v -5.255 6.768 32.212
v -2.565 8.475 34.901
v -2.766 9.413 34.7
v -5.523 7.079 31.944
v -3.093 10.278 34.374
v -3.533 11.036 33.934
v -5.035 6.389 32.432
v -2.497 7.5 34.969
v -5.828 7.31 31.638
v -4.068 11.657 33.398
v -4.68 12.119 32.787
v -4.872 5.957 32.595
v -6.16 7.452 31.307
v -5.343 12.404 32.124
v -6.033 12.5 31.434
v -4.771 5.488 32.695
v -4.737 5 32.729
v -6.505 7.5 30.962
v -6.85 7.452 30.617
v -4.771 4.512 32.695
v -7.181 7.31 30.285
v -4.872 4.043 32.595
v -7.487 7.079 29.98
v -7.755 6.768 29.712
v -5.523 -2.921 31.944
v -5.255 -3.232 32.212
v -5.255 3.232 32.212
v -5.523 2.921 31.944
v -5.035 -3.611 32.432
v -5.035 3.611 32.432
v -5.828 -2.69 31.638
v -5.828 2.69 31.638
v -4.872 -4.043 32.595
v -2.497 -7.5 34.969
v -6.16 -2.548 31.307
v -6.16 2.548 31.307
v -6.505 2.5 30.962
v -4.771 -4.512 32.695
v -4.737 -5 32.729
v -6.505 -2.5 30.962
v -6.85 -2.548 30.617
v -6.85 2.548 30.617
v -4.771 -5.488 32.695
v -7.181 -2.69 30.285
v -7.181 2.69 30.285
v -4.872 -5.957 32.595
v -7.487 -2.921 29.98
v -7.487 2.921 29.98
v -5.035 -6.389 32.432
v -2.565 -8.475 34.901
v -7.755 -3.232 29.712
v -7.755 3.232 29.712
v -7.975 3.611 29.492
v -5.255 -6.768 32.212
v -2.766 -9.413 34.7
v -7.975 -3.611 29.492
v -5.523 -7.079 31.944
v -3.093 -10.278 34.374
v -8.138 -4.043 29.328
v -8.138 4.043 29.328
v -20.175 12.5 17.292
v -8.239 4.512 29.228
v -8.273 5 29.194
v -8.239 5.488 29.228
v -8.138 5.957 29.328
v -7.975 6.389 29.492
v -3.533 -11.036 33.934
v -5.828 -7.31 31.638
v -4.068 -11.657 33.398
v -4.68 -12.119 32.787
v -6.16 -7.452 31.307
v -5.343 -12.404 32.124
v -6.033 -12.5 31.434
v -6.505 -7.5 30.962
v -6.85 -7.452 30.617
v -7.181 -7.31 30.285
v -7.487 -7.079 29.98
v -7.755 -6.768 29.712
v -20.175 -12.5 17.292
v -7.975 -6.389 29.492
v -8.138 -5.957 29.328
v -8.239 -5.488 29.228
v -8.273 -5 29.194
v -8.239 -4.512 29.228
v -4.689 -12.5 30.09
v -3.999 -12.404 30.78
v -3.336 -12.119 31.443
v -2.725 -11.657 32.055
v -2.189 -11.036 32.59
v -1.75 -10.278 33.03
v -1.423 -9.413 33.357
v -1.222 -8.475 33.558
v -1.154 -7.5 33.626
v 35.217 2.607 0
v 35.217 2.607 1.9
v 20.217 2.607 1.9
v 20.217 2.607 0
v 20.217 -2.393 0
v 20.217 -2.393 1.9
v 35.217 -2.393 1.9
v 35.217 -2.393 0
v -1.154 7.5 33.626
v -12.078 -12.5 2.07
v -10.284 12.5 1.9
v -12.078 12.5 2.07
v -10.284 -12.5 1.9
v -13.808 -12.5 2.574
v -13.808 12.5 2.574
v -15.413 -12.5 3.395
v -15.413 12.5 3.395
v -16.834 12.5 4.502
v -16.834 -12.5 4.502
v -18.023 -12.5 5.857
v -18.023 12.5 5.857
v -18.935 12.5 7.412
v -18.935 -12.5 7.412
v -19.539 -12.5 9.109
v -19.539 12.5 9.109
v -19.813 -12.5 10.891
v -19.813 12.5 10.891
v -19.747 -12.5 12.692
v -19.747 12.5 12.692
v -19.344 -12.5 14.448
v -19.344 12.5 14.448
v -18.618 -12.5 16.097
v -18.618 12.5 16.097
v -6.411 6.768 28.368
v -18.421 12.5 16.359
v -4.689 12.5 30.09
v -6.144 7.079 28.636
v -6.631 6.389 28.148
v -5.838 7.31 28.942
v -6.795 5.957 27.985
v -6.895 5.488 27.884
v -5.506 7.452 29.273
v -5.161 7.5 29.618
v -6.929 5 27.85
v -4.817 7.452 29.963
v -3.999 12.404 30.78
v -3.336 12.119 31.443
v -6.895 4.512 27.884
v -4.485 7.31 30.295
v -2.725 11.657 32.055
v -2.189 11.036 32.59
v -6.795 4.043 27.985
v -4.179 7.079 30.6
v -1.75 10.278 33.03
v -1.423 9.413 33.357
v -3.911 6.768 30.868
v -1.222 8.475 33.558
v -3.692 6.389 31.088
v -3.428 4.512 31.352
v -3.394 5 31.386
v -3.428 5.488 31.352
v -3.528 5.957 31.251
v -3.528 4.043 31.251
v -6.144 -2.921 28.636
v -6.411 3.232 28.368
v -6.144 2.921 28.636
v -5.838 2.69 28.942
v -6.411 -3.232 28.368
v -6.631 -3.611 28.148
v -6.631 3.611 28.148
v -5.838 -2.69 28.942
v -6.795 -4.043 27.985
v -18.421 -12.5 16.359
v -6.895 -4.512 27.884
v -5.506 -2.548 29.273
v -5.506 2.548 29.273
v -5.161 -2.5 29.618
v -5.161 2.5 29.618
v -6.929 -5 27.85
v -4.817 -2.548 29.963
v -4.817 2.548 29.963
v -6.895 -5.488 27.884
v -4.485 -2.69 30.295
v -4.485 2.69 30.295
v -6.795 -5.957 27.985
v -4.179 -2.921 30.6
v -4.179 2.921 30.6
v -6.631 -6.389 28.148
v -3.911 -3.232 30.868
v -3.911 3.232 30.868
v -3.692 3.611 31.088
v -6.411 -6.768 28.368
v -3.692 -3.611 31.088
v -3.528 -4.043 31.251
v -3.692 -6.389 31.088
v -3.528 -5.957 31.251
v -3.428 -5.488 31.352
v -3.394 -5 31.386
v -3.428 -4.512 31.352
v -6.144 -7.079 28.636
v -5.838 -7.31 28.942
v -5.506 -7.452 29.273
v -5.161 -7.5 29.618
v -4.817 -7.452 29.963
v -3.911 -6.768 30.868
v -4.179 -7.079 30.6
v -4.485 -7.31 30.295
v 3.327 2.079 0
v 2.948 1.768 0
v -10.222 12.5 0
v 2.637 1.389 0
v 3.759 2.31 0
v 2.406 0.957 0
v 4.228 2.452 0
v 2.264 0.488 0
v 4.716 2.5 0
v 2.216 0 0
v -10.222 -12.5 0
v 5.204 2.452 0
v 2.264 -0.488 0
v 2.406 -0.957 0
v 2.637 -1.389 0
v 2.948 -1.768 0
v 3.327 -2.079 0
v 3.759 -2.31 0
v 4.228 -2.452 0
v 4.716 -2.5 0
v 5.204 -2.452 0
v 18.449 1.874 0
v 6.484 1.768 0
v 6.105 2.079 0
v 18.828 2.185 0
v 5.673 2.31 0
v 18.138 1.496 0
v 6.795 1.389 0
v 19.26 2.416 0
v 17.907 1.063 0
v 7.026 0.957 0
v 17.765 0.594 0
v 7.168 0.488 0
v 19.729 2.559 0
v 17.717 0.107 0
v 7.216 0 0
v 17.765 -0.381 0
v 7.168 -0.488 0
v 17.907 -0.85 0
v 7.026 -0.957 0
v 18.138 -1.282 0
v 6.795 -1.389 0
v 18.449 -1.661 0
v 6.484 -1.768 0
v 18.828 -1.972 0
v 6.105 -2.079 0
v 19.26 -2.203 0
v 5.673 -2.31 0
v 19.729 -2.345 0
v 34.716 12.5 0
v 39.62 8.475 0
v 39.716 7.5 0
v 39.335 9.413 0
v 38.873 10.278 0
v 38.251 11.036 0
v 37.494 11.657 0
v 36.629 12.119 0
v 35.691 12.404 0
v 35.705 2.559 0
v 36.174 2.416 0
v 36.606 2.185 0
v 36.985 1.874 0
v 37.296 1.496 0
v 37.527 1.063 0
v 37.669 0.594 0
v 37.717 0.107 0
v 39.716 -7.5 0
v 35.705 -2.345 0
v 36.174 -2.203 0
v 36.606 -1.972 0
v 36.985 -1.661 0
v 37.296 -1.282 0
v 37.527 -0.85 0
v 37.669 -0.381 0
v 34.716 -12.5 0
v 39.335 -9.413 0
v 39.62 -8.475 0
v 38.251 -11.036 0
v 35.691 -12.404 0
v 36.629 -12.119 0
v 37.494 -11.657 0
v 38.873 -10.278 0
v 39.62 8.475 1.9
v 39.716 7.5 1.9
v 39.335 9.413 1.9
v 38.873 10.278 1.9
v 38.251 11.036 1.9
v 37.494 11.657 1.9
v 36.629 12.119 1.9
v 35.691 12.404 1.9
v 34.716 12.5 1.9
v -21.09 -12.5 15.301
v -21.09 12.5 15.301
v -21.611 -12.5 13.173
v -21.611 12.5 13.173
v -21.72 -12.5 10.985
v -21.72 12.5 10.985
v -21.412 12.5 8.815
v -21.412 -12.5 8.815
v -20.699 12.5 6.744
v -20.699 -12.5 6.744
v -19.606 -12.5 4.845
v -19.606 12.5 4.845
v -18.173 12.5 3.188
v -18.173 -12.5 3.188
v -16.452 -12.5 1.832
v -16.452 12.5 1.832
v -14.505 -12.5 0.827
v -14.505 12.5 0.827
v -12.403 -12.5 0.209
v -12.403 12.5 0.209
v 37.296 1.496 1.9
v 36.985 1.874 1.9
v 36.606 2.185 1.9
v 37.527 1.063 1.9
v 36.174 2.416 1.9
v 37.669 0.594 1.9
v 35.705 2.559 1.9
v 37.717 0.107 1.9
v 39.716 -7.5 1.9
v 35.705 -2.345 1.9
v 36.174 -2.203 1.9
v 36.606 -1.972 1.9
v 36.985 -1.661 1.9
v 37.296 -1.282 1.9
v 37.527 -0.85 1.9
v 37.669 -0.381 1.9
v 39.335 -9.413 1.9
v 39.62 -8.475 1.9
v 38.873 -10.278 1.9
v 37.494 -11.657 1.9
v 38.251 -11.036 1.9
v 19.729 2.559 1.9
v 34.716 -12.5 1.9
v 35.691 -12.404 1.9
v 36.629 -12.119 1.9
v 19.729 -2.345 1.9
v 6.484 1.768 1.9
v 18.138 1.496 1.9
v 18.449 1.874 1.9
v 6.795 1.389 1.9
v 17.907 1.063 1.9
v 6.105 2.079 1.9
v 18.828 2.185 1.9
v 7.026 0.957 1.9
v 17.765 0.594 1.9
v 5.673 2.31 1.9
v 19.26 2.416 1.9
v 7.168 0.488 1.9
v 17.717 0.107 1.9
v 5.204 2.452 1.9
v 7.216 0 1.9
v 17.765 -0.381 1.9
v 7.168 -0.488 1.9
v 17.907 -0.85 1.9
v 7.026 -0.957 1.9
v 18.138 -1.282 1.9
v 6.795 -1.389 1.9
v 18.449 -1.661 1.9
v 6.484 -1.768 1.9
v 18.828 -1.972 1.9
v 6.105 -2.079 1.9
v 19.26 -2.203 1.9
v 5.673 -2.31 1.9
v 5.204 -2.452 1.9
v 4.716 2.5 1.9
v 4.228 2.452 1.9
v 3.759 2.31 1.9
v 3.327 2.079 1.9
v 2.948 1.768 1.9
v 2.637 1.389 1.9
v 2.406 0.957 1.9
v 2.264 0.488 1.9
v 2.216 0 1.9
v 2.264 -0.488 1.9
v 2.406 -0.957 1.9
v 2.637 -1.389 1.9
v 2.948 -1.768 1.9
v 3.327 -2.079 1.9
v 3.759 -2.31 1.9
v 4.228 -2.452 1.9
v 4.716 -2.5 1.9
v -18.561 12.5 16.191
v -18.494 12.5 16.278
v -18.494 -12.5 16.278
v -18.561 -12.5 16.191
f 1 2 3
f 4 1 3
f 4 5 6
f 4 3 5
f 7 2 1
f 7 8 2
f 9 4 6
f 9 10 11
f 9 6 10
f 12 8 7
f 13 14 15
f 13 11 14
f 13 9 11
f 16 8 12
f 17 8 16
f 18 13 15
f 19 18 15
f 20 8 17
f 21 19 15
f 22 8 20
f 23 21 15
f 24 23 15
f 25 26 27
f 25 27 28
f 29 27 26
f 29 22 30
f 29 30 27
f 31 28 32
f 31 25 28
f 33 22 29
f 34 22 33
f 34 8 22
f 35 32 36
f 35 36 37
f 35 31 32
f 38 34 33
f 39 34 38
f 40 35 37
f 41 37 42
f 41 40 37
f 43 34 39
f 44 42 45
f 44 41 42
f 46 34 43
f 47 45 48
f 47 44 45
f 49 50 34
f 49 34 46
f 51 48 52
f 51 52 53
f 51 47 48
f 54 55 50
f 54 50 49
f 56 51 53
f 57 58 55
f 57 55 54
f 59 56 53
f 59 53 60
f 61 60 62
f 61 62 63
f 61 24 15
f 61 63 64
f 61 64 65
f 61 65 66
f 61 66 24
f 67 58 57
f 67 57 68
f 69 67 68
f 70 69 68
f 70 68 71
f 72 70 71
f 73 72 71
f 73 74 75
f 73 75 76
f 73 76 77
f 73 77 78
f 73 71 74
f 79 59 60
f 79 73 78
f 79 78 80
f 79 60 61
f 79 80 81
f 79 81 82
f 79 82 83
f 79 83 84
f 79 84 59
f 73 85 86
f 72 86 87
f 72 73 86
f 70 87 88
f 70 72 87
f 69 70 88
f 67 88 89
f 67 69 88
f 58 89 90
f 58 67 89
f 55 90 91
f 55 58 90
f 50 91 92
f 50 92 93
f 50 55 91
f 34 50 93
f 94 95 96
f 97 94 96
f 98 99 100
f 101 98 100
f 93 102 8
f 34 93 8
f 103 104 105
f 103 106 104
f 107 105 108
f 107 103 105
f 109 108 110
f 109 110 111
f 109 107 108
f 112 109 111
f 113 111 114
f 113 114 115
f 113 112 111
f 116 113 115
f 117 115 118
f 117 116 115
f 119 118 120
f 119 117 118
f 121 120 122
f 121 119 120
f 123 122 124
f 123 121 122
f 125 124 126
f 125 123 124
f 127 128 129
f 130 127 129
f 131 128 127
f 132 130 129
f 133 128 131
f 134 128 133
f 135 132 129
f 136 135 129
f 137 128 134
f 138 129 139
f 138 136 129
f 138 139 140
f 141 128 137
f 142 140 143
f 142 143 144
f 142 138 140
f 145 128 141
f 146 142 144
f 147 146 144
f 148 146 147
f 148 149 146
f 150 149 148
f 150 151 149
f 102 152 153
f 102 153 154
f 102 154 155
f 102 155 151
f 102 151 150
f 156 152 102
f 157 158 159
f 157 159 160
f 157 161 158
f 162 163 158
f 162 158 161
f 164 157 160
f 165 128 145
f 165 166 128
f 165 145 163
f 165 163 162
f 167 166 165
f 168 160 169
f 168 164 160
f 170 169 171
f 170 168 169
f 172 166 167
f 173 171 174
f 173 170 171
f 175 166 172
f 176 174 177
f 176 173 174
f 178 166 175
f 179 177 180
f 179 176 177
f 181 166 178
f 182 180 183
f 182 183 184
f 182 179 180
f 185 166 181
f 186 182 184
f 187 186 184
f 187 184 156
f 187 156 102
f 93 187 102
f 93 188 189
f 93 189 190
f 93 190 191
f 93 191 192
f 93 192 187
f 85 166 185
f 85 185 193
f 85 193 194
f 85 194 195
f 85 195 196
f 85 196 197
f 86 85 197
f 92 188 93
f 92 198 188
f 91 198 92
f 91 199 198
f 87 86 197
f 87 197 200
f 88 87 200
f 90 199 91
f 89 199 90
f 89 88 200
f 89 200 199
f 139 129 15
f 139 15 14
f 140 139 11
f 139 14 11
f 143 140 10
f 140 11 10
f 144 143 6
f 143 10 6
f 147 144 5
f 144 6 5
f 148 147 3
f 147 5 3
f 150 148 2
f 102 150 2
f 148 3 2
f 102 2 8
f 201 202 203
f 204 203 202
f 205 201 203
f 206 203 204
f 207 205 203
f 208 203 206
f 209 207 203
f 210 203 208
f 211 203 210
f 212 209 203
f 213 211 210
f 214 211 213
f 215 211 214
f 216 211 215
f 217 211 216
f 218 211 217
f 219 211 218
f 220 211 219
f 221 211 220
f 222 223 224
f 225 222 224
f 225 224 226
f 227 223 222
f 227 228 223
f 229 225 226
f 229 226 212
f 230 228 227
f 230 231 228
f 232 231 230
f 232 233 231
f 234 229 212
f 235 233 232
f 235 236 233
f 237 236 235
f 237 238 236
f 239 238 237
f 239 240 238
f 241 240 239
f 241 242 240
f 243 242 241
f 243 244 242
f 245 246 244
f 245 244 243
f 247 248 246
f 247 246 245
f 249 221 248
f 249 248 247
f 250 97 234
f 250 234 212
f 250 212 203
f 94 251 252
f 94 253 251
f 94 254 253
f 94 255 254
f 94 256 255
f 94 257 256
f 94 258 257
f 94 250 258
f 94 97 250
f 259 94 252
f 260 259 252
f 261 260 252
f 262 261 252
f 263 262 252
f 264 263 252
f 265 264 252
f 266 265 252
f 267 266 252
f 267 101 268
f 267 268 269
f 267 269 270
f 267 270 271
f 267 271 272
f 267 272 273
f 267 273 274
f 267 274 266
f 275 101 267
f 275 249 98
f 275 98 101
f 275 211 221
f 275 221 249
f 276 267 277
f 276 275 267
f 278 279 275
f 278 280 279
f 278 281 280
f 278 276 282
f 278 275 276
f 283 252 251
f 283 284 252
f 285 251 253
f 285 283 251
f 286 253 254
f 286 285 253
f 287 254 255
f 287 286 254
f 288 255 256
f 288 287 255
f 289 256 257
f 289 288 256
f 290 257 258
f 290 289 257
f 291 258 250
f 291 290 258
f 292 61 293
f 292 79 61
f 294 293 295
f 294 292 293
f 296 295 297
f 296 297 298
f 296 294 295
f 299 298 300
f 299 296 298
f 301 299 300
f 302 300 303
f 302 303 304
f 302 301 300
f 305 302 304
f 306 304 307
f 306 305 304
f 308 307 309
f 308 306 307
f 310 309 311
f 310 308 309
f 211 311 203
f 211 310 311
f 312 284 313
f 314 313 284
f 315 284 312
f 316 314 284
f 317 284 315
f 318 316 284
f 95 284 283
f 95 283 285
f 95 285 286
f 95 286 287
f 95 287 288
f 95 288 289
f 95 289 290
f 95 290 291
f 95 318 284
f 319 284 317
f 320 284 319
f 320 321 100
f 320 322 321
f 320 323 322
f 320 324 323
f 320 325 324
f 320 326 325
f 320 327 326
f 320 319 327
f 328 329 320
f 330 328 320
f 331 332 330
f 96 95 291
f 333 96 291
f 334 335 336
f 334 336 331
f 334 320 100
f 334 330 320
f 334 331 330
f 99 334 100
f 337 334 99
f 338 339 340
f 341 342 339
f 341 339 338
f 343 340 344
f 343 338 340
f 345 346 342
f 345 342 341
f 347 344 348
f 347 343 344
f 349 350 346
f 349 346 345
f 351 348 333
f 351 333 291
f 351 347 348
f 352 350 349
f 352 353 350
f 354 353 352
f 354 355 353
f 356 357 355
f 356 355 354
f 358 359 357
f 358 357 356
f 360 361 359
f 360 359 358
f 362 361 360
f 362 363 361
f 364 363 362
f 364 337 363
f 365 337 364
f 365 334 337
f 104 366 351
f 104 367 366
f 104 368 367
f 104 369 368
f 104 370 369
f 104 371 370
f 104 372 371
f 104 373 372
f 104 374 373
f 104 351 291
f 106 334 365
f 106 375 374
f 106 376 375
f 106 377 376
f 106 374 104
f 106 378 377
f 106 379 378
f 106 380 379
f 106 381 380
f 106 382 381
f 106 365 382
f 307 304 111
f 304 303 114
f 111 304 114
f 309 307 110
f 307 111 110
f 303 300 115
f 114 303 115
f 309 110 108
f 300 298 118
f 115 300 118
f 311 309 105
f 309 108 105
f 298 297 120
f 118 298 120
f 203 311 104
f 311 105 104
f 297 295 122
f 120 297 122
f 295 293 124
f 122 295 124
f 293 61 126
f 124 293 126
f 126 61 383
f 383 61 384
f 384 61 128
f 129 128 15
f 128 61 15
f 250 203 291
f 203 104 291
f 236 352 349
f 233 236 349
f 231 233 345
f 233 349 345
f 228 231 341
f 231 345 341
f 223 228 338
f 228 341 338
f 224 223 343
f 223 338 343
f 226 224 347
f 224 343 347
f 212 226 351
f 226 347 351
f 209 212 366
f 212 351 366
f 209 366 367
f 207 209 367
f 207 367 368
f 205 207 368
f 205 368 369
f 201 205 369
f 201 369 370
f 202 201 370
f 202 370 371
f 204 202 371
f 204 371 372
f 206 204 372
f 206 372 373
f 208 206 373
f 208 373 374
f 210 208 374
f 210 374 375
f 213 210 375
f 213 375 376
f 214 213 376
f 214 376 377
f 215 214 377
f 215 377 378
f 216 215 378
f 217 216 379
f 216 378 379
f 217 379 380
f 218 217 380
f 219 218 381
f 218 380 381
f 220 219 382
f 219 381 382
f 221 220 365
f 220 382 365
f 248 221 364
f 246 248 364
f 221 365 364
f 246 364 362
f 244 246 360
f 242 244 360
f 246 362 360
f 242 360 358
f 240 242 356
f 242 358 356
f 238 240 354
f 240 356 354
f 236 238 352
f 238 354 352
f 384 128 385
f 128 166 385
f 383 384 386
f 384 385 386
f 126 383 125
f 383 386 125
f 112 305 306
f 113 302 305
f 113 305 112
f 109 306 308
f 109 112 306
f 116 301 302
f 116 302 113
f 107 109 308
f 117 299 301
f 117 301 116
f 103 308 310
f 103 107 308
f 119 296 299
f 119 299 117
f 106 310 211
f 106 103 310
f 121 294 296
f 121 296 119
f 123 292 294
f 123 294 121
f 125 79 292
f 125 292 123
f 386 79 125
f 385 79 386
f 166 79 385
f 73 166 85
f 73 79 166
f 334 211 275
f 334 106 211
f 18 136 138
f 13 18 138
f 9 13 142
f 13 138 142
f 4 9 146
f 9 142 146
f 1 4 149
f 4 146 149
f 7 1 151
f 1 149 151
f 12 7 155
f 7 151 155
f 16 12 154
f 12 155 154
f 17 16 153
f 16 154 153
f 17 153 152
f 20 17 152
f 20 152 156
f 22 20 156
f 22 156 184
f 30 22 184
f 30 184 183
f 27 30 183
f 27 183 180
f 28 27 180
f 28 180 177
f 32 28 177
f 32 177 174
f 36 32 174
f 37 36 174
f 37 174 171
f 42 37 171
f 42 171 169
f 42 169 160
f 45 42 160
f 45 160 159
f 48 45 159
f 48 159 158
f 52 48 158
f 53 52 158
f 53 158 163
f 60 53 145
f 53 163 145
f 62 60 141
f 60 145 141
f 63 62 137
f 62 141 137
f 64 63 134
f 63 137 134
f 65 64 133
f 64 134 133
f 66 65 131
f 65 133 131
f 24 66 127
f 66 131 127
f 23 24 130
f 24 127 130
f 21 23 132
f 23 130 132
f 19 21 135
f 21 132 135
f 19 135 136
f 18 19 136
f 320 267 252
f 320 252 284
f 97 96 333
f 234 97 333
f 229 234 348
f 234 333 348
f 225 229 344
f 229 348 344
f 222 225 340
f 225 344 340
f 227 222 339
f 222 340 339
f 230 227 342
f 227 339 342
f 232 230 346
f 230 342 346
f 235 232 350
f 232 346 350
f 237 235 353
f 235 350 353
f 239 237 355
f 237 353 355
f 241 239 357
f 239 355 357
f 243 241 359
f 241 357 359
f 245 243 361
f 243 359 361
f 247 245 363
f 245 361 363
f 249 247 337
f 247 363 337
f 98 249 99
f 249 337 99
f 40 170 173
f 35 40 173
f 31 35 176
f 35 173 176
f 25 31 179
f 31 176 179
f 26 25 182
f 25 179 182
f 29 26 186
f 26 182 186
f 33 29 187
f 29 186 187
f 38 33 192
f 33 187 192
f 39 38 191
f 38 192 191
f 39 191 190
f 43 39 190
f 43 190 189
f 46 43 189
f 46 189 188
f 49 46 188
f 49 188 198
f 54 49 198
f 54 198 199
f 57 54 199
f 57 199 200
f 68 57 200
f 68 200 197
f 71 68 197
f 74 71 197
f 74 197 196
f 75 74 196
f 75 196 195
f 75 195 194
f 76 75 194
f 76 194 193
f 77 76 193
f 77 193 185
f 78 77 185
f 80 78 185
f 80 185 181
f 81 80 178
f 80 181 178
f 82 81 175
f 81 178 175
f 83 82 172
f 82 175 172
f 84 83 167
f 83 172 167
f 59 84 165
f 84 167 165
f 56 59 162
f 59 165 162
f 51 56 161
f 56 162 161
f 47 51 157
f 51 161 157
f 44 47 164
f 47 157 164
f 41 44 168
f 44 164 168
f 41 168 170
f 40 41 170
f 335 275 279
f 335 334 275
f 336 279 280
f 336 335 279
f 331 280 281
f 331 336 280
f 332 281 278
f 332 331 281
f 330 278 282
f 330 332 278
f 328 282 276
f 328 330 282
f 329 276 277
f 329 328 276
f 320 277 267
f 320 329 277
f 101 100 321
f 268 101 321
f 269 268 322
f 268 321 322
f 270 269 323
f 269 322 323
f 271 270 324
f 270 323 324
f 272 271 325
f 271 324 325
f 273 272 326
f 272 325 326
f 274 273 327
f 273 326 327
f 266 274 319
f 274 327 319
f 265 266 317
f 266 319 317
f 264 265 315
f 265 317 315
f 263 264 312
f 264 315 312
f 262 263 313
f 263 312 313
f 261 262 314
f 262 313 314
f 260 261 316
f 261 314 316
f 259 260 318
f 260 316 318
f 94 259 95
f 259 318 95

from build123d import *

# Parameters (mm, degrees)
F1_DEPTH       = 12.5
F2_R           = 2.5
F3_DEPTH       = 25
F5_D           = 5
F5_DEPTH       = 12
F5_CBORE_D     = 5
F5_CBORE_DEPTH = 5
F6_R           = 5
F7_R           = 5
F8_R           = 1.190337


with BuildPart() as f1:
    # F0 (on Front) → F1 (new body, symmetric)
    with BuildSketch(Plane.XZ):
        with BuildLine():
            Line((-10.22166, 0), (39.715874, 0))
            Line((39.715874, 0), (39.715874, 1.9))
            Line((39.715874, 1.9), (-10.284126, 1.9))
            ThreePointArc((-10.284126, 1.9), (-18.558483, 6.686742), (-18.533697, 16.245888))
            Line((-18.533697, 16.245888), (-1.153674, 33.625912))
            Line((-1.153674, 33.625912), (-2.497177, 34.969415))
            Line((-2.497177, 34.969415), (-20.174846, 17.291745))
            ThreePointArc((-20.174846, 17.291745), (-20.19751, 5.768283), (-10.22166, 0))
        make_face()
    extrude(amount=F1_DEPTH, both=True)

    # F2 (on face) → F3 (cut)
    with BuildSketch(Plane.XY.offset(1.9)):
        with Locations((4.715874, 0)):
            Circle(F2_R)
        with BuildLine():
            Line((35.217137, 2.606625), (20.217137, 2.606625))
            ThreePointArc((20.217137, 2.606625), (17.717137, 0.106625), (20.217137, -2.393375))
            Line((20.217137, -2.393375), (35.217137, -2.393375))
            ThreePointArc((35.217137, -2.393375), (37.717137, 0.106625), (35.217137, 2.606625))
        make_face()
    extrude(amount=-F3_DEPTH, mode=Mode.SUBTRACT)

    # F5
    with Locations(Plane(origin=(-18.733296, 0, 18.733296), x_dir=(0, -1, 0), z_dir=(-0.707107, 0, 0.707107))):
        with Locations((-5, 17.293558), (5, 17.293558)):
            CounterBoreHole(F5_D / 2, F5_CBORE_D / 2, F5_CBORE_DEPTH, depth=F5_DEPTH)

    # F6
    f6_edges = [f1.edges().sort_by_distance(p)[0] for p in [
        (39.715874, -12.5, 0.95),
        (39.715874, 12.5, 0.95),
    ]]
    fillet(f6_edges, radius=F6_R)

    # F7
    f7_edges = [f1.edges().sort_by_distance(p)[0] for p in [
        (-1.825425, -12.5, 34.297663),
        (-1.825425, 12.5, 34.297663),
    ]]
    fillet(f7_edges, radius=F7_R)

    # F8
    f8_edges = [f1.edges().sort_by_distance(p)[0] for p in [
        (-18.533697, 0, 16.245888),
        (-10.284126, 0, 1.9),
    ]]
    fillet(f8_edges, radius=F8_R)


solid = f1.part
